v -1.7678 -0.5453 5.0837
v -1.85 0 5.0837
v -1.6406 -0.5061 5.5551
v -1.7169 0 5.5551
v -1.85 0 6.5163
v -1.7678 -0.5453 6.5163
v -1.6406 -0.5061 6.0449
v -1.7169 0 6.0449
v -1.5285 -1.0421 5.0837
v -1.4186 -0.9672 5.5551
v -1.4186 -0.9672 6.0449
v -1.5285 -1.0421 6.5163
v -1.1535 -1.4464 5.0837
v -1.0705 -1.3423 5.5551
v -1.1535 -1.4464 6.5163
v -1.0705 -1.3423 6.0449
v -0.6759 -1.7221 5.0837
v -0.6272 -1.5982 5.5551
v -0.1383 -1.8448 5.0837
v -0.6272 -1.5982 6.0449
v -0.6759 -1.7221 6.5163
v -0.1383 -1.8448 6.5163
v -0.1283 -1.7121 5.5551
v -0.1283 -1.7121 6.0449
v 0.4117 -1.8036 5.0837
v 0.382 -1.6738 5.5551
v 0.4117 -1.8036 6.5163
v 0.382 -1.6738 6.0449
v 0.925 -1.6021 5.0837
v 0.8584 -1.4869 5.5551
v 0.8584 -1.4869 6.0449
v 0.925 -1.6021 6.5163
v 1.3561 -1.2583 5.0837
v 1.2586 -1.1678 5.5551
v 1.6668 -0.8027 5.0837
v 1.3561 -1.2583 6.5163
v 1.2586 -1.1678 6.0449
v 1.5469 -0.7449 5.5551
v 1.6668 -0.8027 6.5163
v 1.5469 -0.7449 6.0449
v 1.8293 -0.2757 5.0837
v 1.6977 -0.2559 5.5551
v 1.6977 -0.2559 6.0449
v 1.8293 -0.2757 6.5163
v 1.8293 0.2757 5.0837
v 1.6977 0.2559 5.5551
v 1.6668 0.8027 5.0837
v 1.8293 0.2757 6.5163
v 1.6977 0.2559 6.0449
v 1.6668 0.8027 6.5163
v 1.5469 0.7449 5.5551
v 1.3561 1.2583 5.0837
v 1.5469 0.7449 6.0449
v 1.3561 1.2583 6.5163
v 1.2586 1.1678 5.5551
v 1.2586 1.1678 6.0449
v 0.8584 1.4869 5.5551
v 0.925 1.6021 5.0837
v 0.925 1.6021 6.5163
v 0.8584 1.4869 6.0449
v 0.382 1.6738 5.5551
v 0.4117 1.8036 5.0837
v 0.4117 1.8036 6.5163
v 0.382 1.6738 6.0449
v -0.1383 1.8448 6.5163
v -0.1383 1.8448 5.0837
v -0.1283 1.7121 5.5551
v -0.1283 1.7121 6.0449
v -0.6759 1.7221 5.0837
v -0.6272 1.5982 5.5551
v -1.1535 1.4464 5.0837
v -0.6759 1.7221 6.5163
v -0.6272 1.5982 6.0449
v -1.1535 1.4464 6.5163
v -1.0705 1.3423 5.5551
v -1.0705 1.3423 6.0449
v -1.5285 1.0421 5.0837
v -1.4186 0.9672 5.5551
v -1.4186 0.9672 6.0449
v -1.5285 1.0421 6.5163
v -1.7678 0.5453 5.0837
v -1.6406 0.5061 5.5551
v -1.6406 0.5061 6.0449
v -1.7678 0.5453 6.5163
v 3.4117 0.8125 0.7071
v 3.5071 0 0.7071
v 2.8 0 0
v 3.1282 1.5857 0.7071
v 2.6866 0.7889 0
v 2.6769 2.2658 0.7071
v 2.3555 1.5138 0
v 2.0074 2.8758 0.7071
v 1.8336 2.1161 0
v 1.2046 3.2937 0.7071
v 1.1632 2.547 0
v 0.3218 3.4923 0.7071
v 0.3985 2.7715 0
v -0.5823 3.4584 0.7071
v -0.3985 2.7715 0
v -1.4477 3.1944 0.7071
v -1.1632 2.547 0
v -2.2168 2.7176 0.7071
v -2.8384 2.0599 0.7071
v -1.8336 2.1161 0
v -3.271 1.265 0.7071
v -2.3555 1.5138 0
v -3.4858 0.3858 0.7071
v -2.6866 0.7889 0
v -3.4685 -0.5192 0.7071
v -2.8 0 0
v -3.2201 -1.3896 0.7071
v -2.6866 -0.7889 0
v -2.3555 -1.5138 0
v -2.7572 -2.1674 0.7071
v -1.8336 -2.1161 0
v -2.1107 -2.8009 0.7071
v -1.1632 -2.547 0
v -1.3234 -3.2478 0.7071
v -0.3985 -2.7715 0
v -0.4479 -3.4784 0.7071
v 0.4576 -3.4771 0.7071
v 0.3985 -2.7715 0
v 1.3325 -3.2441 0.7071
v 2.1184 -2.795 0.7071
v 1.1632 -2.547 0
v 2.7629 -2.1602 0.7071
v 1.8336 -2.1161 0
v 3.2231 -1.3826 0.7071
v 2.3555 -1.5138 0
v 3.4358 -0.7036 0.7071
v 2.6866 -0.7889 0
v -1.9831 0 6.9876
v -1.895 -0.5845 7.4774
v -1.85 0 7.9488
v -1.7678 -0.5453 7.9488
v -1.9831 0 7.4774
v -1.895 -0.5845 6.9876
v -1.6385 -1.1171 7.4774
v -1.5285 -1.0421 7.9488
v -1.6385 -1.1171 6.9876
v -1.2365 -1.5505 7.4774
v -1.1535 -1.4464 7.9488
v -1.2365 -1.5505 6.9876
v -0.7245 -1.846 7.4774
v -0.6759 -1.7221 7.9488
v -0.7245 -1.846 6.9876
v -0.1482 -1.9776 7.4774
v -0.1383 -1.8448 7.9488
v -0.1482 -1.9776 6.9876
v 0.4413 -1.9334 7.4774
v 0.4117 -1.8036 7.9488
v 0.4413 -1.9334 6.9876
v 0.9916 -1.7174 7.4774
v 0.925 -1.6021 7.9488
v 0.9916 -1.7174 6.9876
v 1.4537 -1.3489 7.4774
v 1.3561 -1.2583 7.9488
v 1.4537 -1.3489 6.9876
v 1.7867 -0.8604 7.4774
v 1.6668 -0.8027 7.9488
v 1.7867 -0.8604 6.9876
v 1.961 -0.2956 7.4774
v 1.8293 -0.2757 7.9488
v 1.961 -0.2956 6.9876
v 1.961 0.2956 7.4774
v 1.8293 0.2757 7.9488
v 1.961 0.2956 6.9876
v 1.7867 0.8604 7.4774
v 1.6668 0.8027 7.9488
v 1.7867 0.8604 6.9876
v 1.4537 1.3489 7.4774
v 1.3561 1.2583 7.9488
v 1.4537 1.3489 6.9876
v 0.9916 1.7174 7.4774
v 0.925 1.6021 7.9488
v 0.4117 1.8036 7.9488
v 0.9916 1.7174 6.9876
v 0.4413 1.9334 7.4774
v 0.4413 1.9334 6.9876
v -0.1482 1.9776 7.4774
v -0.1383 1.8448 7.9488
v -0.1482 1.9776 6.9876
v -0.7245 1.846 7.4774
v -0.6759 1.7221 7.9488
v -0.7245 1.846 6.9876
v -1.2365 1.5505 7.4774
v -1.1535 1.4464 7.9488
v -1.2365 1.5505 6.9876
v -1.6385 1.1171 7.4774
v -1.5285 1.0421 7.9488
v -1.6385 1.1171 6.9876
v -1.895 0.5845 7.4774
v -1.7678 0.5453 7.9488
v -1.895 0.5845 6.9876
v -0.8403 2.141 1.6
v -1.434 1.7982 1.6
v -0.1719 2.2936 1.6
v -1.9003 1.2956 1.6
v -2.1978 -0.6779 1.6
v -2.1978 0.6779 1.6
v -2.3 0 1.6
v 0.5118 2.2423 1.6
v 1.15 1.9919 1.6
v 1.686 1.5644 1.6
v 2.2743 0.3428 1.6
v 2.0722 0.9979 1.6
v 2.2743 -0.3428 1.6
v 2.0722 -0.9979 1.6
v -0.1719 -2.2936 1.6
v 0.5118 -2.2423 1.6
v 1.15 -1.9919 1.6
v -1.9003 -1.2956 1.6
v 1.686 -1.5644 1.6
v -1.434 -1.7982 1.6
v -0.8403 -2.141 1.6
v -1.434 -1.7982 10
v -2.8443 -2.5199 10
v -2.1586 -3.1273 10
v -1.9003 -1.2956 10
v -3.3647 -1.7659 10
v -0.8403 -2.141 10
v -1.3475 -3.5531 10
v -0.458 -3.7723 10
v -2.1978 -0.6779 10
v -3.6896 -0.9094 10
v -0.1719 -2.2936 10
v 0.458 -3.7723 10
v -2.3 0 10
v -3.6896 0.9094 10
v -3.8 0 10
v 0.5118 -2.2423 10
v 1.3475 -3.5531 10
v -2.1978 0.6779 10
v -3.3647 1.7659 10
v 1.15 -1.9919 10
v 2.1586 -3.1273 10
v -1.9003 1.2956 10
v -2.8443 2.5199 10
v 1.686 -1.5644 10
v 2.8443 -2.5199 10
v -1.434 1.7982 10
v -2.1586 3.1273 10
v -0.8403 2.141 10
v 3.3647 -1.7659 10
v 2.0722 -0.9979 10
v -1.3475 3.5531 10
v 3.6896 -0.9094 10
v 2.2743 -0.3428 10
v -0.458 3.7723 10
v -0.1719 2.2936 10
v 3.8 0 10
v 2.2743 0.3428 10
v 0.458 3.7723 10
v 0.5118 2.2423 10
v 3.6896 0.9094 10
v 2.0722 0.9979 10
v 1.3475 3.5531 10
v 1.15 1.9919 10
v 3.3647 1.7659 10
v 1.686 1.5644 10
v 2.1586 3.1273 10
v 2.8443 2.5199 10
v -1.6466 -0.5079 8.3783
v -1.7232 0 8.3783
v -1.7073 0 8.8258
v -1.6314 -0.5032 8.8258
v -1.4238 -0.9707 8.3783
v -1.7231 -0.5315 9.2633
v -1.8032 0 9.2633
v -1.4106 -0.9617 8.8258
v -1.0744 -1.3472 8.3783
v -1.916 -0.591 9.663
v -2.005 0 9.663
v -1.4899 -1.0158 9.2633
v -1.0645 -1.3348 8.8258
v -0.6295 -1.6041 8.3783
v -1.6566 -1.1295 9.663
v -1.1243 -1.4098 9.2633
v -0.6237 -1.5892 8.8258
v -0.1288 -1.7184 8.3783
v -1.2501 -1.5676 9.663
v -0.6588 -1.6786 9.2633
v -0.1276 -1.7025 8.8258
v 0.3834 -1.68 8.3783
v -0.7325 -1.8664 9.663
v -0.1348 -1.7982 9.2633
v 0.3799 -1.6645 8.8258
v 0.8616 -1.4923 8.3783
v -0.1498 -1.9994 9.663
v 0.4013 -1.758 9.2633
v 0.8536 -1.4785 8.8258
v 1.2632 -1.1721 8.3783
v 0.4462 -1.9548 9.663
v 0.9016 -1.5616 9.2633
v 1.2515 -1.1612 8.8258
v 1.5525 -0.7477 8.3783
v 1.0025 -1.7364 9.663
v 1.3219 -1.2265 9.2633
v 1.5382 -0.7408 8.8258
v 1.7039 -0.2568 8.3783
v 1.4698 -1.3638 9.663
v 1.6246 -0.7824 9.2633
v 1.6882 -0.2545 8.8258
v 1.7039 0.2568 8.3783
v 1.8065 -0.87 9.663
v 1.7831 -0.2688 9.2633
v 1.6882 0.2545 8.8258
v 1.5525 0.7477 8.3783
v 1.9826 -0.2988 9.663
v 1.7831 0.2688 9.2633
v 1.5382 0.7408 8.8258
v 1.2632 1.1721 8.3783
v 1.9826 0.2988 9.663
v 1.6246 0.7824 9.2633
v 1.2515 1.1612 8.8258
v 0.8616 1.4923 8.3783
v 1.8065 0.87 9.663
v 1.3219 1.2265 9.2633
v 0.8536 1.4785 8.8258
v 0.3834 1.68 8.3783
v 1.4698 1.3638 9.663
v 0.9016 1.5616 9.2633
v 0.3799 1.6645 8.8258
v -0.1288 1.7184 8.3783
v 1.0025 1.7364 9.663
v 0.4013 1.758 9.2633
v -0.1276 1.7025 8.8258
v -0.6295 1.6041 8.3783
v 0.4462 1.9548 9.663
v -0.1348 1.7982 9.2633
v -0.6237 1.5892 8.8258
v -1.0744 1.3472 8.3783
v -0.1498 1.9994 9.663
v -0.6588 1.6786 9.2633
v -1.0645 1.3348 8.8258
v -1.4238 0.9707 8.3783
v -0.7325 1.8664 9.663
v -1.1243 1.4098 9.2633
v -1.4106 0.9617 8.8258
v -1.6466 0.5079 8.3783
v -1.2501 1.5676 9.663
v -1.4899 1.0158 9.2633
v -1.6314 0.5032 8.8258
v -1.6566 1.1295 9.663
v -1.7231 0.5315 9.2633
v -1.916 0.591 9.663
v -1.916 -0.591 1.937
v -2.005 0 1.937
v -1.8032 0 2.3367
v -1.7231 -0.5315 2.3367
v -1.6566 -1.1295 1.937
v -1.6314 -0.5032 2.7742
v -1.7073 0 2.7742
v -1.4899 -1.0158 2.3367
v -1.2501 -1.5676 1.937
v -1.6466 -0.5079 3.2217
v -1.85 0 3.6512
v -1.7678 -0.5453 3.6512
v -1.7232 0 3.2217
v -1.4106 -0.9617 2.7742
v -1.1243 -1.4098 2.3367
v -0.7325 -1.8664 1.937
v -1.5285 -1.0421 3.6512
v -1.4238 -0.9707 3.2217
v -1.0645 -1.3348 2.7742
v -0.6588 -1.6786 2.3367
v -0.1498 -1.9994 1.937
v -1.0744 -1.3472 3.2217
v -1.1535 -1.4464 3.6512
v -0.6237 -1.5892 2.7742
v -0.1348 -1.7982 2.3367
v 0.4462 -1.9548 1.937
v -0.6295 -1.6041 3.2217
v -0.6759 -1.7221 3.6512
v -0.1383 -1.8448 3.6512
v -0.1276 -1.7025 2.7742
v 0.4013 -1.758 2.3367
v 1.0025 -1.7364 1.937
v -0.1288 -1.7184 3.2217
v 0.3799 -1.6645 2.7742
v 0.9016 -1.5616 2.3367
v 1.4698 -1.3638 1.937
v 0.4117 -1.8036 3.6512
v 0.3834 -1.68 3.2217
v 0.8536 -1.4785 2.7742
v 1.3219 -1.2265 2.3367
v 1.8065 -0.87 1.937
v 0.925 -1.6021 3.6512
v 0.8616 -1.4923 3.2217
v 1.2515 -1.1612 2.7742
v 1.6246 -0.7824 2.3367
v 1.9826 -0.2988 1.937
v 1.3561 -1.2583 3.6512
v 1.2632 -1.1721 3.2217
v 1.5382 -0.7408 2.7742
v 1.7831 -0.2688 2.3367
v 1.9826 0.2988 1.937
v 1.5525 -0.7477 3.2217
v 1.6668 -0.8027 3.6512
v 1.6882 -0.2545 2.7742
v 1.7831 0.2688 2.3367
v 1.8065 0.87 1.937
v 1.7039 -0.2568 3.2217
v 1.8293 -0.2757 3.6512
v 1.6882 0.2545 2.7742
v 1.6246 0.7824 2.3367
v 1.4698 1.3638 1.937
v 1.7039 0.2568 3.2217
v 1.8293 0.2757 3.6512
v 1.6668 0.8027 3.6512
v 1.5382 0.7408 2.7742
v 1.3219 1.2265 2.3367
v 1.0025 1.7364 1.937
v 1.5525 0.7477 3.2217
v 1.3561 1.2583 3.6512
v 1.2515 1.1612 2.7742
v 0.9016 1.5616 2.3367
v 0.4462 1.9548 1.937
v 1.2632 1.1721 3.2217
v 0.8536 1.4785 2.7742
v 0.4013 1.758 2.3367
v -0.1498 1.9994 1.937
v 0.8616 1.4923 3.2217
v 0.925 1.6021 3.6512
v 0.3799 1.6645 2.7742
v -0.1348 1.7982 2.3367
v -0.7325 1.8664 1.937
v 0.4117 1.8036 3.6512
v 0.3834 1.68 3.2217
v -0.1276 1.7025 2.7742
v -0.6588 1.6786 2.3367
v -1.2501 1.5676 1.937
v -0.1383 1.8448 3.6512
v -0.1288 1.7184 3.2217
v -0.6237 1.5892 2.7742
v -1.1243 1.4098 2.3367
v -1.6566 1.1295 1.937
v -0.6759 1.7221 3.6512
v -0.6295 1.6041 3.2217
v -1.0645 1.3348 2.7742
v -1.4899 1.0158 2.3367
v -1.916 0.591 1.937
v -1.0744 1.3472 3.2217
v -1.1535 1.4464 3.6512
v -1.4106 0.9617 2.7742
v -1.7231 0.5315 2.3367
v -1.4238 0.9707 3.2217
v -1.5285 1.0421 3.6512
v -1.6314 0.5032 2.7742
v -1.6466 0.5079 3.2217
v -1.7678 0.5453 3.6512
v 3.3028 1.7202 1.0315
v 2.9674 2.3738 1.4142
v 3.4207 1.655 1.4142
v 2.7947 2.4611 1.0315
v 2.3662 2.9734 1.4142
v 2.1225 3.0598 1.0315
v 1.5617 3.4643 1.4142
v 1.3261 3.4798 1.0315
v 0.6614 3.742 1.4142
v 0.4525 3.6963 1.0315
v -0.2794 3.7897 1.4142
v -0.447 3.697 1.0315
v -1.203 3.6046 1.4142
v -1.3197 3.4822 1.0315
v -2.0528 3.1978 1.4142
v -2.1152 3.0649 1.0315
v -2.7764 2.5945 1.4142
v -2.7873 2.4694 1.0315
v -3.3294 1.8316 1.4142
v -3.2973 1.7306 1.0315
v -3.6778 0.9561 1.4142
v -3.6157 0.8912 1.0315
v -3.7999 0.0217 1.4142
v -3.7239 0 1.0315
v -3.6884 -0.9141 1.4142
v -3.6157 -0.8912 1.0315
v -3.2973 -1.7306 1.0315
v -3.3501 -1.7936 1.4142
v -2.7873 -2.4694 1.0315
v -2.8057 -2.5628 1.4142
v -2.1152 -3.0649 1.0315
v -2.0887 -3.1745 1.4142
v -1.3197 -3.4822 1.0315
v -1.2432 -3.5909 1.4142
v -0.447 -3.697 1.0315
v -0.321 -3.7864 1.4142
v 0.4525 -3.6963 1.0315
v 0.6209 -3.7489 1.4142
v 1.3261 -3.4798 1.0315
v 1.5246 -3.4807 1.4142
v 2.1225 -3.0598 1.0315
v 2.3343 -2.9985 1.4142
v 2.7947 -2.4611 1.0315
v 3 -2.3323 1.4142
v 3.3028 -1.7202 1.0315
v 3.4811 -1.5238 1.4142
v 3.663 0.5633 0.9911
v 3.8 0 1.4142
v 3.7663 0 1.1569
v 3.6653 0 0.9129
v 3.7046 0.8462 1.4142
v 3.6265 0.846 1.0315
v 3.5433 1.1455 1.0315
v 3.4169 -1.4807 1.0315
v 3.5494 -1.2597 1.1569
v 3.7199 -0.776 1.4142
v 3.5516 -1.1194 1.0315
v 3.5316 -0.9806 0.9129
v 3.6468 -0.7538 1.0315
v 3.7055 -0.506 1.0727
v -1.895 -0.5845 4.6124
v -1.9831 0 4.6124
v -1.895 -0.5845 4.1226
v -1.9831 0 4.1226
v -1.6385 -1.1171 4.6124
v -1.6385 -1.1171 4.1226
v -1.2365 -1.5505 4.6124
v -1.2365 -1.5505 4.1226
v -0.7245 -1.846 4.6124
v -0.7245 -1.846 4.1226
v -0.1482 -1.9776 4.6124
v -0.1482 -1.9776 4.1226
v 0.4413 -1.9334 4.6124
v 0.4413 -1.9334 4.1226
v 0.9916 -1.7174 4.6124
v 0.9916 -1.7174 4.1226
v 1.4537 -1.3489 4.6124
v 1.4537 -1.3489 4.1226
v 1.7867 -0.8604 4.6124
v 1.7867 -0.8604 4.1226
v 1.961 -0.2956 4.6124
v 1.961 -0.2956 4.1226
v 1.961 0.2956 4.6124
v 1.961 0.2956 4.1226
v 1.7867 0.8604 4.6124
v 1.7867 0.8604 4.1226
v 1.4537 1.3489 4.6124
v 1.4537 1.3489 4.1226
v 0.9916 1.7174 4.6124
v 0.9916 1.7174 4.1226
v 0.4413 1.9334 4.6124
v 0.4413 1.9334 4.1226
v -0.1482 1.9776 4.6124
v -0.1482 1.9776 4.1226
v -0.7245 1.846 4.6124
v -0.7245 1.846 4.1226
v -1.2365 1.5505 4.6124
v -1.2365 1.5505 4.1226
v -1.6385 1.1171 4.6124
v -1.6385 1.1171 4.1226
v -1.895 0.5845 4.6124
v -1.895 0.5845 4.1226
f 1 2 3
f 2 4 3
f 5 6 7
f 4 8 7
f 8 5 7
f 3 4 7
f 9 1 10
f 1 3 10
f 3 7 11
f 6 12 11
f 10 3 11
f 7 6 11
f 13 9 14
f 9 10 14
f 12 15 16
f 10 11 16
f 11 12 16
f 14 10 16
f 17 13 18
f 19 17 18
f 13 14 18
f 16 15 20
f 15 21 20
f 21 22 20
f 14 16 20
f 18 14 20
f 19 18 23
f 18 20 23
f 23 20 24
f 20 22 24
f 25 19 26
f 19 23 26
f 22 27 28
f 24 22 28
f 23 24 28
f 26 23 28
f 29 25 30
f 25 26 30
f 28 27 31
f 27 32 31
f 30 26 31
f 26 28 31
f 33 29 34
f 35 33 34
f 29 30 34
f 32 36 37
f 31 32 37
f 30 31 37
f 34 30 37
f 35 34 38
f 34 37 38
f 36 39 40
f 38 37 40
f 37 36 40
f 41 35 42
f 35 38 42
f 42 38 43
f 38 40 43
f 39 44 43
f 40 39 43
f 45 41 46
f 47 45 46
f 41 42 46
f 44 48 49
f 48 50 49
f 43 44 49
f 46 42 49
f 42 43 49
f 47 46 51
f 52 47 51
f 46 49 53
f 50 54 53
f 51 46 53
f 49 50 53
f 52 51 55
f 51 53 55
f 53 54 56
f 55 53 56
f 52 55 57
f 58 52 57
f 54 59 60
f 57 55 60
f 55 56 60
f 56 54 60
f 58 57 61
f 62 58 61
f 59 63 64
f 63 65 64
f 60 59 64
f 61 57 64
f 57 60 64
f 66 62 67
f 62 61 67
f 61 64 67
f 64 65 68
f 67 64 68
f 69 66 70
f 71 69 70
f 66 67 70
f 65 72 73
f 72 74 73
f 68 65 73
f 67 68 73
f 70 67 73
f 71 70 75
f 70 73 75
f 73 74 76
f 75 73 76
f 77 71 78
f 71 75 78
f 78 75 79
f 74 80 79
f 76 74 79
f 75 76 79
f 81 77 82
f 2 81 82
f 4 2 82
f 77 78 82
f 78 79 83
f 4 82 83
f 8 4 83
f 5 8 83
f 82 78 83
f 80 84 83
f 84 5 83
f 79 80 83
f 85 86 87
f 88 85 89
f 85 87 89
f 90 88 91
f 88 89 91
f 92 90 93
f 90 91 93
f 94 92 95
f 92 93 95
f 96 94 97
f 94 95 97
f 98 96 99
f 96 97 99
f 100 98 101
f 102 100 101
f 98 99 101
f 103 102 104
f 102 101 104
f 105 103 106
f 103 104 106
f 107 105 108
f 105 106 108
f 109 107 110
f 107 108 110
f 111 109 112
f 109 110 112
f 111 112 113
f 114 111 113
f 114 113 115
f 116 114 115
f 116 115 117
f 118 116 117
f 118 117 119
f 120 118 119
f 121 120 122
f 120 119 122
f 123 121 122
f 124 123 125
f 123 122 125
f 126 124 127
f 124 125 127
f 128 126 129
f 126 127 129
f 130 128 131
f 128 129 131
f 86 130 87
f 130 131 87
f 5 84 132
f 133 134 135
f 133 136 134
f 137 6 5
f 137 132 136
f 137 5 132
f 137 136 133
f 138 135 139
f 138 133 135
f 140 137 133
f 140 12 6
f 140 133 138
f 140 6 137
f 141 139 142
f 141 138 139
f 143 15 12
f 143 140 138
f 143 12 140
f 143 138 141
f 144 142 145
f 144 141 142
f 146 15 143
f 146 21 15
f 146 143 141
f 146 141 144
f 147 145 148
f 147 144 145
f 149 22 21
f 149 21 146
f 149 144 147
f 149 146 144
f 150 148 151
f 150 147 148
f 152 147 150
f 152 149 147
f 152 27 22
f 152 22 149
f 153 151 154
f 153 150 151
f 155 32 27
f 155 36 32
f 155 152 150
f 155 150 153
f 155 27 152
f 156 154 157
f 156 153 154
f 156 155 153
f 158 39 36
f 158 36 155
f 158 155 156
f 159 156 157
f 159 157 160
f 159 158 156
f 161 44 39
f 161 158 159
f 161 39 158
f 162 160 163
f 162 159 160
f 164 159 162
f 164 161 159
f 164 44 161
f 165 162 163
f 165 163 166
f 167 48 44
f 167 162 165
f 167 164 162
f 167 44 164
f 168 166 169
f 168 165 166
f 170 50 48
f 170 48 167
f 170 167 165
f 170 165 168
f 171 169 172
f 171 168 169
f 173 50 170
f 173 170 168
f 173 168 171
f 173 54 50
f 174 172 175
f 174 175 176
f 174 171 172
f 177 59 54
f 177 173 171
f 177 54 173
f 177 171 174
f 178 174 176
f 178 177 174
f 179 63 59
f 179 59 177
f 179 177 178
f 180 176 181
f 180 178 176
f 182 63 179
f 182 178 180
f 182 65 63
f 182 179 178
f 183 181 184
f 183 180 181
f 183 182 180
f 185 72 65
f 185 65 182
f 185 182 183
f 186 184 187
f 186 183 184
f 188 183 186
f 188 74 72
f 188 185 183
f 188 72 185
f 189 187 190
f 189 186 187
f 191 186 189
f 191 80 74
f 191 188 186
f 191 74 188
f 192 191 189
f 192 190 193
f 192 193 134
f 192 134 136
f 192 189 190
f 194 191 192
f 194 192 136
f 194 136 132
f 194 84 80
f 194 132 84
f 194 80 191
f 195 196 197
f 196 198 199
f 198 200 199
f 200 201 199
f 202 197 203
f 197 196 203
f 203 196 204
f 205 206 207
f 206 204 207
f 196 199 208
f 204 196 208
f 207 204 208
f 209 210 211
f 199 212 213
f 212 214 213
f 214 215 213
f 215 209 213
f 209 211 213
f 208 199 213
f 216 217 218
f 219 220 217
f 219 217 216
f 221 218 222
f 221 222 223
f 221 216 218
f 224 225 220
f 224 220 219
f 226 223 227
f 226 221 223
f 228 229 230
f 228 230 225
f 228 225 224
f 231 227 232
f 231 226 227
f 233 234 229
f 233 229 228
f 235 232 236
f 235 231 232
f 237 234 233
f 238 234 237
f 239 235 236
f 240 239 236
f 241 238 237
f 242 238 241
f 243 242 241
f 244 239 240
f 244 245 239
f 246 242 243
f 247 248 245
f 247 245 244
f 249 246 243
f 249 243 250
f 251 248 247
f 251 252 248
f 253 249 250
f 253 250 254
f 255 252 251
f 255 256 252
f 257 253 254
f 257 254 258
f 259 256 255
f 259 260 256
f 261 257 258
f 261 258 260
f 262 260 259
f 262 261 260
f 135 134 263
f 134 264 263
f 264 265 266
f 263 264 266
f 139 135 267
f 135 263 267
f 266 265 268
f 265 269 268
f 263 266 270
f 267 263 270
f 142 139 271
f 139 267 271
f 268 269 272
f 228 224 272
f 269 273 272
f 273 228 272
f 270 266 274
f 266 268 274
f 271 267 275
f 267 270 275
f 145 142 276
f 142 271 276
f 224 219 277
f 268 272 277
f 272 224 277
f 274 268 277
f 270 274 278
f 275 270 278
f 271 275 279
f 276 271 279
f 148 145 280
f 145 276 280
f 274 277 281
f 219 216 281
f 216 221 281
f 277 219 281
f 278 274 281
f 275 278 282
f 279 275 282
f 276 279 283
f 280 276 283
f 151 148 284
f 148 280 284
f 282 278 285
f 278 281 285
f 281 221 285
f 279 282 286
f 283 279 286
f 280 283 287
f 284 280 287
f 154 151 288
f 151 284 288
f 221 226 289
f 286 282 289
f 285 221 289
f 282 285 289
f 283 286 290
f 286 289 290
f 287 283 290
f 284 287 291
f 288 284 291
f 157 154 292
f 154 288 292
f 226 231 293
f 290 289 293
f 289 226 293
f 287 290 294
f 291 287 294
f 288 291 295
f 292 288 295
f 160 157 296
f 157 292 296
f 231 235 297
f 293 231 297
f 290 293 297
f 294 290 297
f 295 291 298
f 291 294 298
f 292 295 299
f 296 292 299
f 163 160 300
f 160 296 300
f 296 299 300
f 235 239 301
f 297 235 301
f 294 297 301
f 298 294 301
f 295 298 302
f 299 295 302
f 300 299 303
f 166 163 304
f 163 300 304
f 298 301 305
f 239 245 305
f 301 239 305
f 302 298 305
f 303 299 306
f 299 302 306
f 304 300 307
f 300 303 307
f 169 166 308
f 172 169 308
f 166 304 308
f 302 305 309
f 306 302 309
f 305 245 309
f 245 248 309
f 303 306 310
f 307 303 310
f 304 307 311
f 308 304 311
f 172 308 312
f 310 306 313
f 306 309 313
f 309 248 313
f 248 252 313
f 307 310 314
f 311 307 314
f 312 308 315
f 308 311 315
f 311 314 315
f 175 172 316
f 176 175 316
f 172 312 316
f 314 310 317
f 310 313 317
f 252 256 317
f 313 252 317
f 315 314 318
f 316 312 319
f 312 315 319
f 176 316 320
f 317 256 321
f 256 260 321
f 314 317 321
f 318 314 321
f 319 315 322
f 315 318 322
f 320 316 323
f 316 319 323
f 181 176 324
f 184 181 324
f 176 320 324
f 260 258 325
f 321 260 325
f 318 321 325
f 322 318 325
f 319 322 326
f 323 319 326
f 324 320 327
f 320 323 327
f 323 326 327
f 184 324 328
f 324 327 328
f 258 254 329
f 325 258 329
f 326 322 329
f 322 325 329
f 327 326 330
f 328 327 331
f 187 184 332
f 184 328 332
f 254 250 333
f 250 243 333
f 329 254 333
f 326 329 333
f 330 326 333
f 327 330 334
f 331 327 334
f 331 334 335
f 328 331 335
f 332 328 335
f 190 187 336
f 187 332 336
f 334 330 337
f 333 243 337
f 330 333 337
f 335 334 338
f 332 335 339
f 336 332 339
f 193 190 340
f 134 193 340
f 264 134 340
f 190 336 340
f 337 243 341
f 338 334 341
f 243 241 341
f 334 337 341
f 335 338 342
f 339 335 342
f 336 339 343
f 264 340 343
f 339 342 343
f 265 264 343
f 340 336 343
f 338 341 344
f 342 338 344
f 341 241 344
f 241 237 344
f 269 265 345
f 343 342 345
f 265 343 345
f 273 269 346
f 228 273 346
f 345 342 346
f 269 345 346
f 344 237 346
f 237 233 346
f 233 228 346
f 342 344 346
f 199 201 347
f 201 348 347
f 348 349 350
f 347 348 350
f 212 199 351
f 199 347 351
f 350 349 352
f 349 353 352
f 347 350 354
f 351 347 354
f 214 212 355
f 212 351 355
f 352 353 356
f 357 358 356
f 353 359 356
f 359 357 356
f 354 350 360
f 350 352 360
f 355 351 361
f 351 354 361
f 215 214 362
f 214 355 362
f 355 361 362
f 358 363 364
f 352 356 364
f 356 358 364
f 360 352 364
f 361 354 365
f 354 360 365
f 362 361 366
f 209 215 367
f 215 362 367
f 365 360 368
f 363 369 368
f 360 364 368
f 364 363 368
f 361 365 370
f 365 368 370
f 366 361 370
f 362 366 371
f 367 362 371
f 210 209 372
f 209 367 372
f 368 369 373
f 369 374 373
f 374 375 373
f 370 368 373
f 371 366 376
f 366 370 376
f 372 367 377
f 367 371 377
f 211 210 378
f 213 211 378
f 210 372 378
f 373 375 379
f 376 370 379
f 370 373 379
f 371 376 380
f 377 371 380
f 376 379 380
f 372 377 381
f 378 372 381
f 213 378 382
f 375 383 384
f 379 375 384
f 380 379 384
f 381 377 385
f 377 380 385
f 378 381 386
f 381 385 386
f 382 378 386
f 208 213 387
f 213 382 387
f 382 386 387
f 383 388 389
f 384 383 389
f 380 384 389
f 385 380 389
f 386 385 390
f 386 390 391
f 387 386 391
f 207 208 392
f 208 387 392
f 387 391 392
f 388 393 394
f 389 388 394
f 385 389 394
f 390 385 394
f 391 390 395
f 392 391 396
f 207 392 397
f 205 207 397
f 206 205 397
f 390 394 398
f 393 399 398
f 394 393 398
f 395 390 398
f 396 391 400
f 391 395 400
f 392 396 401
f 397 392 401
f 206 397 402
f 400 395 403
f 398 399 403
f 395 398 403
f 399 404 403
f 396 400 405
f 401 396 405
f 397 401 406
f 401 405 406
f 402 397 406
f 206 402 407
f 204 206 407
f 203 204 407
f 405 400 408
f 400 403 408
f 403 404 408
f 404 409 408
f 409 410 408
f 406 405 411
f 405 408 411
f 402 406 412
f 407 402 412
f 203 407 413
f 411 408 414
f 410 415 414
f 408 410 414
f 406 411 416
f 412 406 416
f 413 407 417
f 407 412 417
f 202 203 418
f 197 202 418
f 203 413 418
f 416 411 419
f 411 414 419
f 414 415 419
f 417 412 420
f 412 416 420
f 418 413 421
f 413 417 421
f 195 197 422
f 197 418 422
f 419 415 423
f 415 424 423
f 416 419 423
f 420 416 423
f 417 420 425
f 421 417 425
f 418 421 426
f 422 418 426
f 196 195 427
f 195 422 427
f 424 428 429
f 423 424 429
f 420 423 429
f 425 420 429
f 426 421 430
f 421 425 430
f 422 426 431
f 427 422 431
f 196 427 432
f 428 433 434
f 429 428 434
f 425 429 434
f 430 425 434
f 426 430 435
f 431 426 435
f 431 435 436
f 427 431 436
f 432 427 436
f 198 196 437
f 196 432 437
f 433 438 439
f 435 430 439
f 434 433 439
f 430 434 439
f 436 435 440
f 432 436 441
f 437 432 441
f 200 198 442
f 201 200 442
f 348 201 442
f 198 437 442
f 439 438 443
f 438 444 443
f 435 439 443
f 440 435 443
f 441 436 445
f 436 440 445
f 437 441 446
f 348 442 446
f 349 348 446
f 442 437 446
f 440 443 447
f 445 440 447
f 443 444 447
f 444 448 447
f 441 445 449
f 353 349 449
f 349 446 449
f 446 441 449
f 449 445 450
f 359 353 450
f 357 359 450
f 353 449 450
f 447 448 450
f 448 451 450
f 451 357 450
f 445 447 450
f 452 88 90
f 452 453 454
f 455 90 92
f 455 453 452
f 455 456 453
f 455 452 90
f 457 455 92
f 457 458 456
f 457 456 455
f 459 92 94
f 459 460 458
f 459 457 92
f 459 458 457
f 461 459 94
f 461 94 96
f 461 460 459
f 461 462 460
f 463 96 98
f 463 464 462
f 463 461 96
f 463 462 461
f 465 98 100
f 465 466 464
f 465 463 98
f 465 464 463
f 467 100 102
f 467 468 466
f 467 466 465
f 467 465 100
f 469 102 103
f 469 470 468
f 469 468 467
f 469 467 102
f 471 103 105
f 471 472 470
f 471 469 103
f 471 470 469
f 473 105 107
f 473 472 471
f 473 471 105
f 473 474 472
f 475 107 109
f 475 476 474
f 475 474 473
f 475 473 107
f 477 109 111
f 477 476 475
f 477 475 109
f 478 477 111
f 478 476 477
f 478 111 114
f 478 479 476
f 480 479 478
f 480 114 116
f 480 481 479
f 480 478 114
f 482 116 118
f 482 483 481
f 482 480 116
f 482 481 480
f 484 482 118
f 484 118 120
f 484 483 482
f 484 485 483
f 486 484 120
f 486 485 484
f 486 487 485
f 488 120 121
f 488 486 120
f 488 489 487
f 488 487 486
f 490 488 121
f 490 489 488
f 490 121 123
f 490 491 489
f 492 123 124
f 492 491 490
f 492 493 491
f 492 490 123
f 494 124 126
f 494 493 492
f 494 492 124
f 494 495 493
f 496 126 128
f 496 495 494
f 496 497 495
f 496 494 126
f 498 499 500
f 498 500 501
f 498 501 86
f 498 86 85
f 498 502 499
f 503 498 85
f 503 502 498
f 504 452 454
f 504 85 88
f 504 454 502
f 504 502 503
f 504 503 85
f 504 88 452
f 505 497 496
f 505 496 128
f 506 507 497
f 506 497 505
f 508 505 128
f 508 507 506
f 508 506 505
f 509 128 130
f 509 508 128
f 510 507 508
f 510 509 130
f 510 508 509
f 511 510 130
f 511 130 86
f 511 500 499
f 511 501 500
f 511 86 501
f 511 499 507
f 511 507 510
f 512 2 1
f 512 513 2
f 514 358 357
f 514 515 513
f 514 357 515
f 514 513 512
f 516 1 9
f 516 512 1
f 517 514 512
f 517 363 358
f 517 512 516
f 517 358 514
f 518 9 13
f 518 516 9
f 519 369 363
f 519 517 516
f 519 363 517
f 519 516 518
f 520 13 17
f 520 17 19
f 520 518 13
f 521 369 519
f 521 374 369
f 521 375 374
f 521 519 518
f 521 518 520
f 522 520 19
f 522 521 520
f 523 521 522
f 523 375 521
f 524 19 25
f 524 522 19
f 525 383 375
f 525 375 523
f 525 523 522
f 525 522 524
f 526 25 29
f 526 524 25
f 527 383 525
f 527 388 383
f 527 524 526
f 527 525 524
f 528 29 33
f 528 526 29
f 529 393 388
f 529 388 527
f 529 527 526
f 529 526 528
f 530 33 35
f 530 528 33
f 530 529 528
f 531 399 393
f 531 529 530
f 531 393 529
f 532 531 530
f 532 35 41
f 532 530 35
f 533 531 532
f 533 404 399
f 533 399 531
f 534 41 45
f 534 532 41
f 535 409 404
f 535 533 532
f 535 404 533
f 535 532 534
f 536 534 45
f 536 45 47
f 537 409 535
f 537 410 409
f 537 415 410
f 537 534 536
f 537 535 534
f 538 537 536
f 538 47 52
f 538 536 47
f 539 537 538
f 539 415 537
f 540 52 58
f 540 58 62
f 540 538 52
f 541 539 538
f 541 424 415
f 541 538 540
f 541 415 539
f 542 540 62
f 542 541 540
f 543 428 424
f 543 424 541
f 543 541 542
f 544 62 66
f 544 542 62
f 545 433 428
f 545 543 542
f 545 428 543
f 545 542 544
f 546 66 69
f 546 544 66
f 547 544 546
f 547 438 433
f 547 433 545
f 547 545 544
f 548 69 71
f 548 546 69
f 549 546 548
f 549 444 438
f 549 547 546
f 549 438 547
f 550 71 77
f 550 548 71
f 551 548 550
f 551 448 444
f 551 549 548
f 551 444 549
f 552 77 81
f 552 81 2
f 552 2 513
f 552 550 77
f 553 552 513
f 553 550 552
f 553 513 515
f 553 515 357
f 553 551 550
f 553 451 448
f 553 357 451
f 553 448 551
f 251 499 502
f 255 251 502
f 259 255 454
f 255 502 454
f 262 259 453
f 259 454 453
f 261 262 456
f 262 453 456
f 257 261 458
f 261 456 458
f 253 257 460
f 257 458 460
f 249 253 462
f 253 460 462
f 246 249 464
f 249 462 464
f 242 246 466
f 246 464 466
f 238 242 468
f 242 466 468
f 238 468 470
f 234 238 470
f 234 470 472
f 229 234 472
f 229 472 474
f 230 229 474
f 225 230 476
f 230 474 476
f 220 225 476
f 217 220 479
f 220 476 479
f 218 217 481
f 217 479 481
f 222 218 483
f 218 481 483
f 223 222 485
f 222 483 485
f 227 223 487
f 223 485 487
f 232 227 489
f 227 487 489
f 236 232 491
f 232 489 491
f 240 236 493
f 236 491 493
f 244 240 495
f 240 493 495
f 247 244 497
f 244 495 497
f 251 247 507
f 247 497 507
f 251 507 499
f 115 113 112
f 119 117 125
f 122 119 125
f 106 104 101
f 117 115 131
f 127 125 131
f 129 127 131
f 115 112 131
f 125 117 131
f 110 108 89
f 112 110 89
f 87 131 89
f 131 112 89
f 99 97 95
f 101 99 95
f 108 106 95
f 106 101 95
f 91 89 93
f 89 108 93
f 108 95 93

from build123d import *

# Parameters (mm, degrees)
SKETCH028_R     = 3.8
PAD007_DEPTH    = 10
CHAMFER003_SIZE = 1
FILLET008_R     = 1


with BuildPart() as part:
    # Sketch028 → Pad007 (new body)
    with BuildSketch(Plane.XY):
        Circle(SKETCH028_R)
    extrude(amount=PAD007_DEPTH)

    # Sketch029 → Groove002 (revolve, cut)
    with BuildSketch(Plane.XZ):
        with BuildLine():
            Line((-2.3, 10), (0, 10))
            Line((0, 1.6), (0, 10))
            Line((0, 1.6), (-2.3, 1.6))
            ThreePointArc((-2.3, 1.6), (-1.741466, 2.552438), (-1.85, 3.651219))
            ThreePointArc((-1.85, 5.08374), (-2, 4.367479), (-1.85, 3.651219))
            ThreePointArc((-1.85, 5.08374), (-1.7, 5.8), (-1.85, 6.51626))
            ThreePointArc((-1.85, 7.948781), (-2, 7.232521), (-1.85, 6.51626))
            ThreePointArc((-1.85, 7.948781), (-1.741466, 9.047562), (-2.3, 10))
        make_face()
    revolve(axis=Axis((0, 0, 0), (0, 0, 1)), mode=Mode.SUBTRACT)

    # Chamfer003
    chamfer003_edges = [part.edges().sort_by_distance(p)[0] for p in [
        (-3.8, 0, 0),
    ]]
    chamfer(chamfer003_edges, length=CHAMFER003_SIZE)

    # Fillet008
    fillet008_edges = [part.edges().sort_by_distance(p)[0] for p in [
        (-3.8, 0, 1),
    ]]
    fillet(fillet008_edges, radius=FILLET008_R)


solid = part.part
